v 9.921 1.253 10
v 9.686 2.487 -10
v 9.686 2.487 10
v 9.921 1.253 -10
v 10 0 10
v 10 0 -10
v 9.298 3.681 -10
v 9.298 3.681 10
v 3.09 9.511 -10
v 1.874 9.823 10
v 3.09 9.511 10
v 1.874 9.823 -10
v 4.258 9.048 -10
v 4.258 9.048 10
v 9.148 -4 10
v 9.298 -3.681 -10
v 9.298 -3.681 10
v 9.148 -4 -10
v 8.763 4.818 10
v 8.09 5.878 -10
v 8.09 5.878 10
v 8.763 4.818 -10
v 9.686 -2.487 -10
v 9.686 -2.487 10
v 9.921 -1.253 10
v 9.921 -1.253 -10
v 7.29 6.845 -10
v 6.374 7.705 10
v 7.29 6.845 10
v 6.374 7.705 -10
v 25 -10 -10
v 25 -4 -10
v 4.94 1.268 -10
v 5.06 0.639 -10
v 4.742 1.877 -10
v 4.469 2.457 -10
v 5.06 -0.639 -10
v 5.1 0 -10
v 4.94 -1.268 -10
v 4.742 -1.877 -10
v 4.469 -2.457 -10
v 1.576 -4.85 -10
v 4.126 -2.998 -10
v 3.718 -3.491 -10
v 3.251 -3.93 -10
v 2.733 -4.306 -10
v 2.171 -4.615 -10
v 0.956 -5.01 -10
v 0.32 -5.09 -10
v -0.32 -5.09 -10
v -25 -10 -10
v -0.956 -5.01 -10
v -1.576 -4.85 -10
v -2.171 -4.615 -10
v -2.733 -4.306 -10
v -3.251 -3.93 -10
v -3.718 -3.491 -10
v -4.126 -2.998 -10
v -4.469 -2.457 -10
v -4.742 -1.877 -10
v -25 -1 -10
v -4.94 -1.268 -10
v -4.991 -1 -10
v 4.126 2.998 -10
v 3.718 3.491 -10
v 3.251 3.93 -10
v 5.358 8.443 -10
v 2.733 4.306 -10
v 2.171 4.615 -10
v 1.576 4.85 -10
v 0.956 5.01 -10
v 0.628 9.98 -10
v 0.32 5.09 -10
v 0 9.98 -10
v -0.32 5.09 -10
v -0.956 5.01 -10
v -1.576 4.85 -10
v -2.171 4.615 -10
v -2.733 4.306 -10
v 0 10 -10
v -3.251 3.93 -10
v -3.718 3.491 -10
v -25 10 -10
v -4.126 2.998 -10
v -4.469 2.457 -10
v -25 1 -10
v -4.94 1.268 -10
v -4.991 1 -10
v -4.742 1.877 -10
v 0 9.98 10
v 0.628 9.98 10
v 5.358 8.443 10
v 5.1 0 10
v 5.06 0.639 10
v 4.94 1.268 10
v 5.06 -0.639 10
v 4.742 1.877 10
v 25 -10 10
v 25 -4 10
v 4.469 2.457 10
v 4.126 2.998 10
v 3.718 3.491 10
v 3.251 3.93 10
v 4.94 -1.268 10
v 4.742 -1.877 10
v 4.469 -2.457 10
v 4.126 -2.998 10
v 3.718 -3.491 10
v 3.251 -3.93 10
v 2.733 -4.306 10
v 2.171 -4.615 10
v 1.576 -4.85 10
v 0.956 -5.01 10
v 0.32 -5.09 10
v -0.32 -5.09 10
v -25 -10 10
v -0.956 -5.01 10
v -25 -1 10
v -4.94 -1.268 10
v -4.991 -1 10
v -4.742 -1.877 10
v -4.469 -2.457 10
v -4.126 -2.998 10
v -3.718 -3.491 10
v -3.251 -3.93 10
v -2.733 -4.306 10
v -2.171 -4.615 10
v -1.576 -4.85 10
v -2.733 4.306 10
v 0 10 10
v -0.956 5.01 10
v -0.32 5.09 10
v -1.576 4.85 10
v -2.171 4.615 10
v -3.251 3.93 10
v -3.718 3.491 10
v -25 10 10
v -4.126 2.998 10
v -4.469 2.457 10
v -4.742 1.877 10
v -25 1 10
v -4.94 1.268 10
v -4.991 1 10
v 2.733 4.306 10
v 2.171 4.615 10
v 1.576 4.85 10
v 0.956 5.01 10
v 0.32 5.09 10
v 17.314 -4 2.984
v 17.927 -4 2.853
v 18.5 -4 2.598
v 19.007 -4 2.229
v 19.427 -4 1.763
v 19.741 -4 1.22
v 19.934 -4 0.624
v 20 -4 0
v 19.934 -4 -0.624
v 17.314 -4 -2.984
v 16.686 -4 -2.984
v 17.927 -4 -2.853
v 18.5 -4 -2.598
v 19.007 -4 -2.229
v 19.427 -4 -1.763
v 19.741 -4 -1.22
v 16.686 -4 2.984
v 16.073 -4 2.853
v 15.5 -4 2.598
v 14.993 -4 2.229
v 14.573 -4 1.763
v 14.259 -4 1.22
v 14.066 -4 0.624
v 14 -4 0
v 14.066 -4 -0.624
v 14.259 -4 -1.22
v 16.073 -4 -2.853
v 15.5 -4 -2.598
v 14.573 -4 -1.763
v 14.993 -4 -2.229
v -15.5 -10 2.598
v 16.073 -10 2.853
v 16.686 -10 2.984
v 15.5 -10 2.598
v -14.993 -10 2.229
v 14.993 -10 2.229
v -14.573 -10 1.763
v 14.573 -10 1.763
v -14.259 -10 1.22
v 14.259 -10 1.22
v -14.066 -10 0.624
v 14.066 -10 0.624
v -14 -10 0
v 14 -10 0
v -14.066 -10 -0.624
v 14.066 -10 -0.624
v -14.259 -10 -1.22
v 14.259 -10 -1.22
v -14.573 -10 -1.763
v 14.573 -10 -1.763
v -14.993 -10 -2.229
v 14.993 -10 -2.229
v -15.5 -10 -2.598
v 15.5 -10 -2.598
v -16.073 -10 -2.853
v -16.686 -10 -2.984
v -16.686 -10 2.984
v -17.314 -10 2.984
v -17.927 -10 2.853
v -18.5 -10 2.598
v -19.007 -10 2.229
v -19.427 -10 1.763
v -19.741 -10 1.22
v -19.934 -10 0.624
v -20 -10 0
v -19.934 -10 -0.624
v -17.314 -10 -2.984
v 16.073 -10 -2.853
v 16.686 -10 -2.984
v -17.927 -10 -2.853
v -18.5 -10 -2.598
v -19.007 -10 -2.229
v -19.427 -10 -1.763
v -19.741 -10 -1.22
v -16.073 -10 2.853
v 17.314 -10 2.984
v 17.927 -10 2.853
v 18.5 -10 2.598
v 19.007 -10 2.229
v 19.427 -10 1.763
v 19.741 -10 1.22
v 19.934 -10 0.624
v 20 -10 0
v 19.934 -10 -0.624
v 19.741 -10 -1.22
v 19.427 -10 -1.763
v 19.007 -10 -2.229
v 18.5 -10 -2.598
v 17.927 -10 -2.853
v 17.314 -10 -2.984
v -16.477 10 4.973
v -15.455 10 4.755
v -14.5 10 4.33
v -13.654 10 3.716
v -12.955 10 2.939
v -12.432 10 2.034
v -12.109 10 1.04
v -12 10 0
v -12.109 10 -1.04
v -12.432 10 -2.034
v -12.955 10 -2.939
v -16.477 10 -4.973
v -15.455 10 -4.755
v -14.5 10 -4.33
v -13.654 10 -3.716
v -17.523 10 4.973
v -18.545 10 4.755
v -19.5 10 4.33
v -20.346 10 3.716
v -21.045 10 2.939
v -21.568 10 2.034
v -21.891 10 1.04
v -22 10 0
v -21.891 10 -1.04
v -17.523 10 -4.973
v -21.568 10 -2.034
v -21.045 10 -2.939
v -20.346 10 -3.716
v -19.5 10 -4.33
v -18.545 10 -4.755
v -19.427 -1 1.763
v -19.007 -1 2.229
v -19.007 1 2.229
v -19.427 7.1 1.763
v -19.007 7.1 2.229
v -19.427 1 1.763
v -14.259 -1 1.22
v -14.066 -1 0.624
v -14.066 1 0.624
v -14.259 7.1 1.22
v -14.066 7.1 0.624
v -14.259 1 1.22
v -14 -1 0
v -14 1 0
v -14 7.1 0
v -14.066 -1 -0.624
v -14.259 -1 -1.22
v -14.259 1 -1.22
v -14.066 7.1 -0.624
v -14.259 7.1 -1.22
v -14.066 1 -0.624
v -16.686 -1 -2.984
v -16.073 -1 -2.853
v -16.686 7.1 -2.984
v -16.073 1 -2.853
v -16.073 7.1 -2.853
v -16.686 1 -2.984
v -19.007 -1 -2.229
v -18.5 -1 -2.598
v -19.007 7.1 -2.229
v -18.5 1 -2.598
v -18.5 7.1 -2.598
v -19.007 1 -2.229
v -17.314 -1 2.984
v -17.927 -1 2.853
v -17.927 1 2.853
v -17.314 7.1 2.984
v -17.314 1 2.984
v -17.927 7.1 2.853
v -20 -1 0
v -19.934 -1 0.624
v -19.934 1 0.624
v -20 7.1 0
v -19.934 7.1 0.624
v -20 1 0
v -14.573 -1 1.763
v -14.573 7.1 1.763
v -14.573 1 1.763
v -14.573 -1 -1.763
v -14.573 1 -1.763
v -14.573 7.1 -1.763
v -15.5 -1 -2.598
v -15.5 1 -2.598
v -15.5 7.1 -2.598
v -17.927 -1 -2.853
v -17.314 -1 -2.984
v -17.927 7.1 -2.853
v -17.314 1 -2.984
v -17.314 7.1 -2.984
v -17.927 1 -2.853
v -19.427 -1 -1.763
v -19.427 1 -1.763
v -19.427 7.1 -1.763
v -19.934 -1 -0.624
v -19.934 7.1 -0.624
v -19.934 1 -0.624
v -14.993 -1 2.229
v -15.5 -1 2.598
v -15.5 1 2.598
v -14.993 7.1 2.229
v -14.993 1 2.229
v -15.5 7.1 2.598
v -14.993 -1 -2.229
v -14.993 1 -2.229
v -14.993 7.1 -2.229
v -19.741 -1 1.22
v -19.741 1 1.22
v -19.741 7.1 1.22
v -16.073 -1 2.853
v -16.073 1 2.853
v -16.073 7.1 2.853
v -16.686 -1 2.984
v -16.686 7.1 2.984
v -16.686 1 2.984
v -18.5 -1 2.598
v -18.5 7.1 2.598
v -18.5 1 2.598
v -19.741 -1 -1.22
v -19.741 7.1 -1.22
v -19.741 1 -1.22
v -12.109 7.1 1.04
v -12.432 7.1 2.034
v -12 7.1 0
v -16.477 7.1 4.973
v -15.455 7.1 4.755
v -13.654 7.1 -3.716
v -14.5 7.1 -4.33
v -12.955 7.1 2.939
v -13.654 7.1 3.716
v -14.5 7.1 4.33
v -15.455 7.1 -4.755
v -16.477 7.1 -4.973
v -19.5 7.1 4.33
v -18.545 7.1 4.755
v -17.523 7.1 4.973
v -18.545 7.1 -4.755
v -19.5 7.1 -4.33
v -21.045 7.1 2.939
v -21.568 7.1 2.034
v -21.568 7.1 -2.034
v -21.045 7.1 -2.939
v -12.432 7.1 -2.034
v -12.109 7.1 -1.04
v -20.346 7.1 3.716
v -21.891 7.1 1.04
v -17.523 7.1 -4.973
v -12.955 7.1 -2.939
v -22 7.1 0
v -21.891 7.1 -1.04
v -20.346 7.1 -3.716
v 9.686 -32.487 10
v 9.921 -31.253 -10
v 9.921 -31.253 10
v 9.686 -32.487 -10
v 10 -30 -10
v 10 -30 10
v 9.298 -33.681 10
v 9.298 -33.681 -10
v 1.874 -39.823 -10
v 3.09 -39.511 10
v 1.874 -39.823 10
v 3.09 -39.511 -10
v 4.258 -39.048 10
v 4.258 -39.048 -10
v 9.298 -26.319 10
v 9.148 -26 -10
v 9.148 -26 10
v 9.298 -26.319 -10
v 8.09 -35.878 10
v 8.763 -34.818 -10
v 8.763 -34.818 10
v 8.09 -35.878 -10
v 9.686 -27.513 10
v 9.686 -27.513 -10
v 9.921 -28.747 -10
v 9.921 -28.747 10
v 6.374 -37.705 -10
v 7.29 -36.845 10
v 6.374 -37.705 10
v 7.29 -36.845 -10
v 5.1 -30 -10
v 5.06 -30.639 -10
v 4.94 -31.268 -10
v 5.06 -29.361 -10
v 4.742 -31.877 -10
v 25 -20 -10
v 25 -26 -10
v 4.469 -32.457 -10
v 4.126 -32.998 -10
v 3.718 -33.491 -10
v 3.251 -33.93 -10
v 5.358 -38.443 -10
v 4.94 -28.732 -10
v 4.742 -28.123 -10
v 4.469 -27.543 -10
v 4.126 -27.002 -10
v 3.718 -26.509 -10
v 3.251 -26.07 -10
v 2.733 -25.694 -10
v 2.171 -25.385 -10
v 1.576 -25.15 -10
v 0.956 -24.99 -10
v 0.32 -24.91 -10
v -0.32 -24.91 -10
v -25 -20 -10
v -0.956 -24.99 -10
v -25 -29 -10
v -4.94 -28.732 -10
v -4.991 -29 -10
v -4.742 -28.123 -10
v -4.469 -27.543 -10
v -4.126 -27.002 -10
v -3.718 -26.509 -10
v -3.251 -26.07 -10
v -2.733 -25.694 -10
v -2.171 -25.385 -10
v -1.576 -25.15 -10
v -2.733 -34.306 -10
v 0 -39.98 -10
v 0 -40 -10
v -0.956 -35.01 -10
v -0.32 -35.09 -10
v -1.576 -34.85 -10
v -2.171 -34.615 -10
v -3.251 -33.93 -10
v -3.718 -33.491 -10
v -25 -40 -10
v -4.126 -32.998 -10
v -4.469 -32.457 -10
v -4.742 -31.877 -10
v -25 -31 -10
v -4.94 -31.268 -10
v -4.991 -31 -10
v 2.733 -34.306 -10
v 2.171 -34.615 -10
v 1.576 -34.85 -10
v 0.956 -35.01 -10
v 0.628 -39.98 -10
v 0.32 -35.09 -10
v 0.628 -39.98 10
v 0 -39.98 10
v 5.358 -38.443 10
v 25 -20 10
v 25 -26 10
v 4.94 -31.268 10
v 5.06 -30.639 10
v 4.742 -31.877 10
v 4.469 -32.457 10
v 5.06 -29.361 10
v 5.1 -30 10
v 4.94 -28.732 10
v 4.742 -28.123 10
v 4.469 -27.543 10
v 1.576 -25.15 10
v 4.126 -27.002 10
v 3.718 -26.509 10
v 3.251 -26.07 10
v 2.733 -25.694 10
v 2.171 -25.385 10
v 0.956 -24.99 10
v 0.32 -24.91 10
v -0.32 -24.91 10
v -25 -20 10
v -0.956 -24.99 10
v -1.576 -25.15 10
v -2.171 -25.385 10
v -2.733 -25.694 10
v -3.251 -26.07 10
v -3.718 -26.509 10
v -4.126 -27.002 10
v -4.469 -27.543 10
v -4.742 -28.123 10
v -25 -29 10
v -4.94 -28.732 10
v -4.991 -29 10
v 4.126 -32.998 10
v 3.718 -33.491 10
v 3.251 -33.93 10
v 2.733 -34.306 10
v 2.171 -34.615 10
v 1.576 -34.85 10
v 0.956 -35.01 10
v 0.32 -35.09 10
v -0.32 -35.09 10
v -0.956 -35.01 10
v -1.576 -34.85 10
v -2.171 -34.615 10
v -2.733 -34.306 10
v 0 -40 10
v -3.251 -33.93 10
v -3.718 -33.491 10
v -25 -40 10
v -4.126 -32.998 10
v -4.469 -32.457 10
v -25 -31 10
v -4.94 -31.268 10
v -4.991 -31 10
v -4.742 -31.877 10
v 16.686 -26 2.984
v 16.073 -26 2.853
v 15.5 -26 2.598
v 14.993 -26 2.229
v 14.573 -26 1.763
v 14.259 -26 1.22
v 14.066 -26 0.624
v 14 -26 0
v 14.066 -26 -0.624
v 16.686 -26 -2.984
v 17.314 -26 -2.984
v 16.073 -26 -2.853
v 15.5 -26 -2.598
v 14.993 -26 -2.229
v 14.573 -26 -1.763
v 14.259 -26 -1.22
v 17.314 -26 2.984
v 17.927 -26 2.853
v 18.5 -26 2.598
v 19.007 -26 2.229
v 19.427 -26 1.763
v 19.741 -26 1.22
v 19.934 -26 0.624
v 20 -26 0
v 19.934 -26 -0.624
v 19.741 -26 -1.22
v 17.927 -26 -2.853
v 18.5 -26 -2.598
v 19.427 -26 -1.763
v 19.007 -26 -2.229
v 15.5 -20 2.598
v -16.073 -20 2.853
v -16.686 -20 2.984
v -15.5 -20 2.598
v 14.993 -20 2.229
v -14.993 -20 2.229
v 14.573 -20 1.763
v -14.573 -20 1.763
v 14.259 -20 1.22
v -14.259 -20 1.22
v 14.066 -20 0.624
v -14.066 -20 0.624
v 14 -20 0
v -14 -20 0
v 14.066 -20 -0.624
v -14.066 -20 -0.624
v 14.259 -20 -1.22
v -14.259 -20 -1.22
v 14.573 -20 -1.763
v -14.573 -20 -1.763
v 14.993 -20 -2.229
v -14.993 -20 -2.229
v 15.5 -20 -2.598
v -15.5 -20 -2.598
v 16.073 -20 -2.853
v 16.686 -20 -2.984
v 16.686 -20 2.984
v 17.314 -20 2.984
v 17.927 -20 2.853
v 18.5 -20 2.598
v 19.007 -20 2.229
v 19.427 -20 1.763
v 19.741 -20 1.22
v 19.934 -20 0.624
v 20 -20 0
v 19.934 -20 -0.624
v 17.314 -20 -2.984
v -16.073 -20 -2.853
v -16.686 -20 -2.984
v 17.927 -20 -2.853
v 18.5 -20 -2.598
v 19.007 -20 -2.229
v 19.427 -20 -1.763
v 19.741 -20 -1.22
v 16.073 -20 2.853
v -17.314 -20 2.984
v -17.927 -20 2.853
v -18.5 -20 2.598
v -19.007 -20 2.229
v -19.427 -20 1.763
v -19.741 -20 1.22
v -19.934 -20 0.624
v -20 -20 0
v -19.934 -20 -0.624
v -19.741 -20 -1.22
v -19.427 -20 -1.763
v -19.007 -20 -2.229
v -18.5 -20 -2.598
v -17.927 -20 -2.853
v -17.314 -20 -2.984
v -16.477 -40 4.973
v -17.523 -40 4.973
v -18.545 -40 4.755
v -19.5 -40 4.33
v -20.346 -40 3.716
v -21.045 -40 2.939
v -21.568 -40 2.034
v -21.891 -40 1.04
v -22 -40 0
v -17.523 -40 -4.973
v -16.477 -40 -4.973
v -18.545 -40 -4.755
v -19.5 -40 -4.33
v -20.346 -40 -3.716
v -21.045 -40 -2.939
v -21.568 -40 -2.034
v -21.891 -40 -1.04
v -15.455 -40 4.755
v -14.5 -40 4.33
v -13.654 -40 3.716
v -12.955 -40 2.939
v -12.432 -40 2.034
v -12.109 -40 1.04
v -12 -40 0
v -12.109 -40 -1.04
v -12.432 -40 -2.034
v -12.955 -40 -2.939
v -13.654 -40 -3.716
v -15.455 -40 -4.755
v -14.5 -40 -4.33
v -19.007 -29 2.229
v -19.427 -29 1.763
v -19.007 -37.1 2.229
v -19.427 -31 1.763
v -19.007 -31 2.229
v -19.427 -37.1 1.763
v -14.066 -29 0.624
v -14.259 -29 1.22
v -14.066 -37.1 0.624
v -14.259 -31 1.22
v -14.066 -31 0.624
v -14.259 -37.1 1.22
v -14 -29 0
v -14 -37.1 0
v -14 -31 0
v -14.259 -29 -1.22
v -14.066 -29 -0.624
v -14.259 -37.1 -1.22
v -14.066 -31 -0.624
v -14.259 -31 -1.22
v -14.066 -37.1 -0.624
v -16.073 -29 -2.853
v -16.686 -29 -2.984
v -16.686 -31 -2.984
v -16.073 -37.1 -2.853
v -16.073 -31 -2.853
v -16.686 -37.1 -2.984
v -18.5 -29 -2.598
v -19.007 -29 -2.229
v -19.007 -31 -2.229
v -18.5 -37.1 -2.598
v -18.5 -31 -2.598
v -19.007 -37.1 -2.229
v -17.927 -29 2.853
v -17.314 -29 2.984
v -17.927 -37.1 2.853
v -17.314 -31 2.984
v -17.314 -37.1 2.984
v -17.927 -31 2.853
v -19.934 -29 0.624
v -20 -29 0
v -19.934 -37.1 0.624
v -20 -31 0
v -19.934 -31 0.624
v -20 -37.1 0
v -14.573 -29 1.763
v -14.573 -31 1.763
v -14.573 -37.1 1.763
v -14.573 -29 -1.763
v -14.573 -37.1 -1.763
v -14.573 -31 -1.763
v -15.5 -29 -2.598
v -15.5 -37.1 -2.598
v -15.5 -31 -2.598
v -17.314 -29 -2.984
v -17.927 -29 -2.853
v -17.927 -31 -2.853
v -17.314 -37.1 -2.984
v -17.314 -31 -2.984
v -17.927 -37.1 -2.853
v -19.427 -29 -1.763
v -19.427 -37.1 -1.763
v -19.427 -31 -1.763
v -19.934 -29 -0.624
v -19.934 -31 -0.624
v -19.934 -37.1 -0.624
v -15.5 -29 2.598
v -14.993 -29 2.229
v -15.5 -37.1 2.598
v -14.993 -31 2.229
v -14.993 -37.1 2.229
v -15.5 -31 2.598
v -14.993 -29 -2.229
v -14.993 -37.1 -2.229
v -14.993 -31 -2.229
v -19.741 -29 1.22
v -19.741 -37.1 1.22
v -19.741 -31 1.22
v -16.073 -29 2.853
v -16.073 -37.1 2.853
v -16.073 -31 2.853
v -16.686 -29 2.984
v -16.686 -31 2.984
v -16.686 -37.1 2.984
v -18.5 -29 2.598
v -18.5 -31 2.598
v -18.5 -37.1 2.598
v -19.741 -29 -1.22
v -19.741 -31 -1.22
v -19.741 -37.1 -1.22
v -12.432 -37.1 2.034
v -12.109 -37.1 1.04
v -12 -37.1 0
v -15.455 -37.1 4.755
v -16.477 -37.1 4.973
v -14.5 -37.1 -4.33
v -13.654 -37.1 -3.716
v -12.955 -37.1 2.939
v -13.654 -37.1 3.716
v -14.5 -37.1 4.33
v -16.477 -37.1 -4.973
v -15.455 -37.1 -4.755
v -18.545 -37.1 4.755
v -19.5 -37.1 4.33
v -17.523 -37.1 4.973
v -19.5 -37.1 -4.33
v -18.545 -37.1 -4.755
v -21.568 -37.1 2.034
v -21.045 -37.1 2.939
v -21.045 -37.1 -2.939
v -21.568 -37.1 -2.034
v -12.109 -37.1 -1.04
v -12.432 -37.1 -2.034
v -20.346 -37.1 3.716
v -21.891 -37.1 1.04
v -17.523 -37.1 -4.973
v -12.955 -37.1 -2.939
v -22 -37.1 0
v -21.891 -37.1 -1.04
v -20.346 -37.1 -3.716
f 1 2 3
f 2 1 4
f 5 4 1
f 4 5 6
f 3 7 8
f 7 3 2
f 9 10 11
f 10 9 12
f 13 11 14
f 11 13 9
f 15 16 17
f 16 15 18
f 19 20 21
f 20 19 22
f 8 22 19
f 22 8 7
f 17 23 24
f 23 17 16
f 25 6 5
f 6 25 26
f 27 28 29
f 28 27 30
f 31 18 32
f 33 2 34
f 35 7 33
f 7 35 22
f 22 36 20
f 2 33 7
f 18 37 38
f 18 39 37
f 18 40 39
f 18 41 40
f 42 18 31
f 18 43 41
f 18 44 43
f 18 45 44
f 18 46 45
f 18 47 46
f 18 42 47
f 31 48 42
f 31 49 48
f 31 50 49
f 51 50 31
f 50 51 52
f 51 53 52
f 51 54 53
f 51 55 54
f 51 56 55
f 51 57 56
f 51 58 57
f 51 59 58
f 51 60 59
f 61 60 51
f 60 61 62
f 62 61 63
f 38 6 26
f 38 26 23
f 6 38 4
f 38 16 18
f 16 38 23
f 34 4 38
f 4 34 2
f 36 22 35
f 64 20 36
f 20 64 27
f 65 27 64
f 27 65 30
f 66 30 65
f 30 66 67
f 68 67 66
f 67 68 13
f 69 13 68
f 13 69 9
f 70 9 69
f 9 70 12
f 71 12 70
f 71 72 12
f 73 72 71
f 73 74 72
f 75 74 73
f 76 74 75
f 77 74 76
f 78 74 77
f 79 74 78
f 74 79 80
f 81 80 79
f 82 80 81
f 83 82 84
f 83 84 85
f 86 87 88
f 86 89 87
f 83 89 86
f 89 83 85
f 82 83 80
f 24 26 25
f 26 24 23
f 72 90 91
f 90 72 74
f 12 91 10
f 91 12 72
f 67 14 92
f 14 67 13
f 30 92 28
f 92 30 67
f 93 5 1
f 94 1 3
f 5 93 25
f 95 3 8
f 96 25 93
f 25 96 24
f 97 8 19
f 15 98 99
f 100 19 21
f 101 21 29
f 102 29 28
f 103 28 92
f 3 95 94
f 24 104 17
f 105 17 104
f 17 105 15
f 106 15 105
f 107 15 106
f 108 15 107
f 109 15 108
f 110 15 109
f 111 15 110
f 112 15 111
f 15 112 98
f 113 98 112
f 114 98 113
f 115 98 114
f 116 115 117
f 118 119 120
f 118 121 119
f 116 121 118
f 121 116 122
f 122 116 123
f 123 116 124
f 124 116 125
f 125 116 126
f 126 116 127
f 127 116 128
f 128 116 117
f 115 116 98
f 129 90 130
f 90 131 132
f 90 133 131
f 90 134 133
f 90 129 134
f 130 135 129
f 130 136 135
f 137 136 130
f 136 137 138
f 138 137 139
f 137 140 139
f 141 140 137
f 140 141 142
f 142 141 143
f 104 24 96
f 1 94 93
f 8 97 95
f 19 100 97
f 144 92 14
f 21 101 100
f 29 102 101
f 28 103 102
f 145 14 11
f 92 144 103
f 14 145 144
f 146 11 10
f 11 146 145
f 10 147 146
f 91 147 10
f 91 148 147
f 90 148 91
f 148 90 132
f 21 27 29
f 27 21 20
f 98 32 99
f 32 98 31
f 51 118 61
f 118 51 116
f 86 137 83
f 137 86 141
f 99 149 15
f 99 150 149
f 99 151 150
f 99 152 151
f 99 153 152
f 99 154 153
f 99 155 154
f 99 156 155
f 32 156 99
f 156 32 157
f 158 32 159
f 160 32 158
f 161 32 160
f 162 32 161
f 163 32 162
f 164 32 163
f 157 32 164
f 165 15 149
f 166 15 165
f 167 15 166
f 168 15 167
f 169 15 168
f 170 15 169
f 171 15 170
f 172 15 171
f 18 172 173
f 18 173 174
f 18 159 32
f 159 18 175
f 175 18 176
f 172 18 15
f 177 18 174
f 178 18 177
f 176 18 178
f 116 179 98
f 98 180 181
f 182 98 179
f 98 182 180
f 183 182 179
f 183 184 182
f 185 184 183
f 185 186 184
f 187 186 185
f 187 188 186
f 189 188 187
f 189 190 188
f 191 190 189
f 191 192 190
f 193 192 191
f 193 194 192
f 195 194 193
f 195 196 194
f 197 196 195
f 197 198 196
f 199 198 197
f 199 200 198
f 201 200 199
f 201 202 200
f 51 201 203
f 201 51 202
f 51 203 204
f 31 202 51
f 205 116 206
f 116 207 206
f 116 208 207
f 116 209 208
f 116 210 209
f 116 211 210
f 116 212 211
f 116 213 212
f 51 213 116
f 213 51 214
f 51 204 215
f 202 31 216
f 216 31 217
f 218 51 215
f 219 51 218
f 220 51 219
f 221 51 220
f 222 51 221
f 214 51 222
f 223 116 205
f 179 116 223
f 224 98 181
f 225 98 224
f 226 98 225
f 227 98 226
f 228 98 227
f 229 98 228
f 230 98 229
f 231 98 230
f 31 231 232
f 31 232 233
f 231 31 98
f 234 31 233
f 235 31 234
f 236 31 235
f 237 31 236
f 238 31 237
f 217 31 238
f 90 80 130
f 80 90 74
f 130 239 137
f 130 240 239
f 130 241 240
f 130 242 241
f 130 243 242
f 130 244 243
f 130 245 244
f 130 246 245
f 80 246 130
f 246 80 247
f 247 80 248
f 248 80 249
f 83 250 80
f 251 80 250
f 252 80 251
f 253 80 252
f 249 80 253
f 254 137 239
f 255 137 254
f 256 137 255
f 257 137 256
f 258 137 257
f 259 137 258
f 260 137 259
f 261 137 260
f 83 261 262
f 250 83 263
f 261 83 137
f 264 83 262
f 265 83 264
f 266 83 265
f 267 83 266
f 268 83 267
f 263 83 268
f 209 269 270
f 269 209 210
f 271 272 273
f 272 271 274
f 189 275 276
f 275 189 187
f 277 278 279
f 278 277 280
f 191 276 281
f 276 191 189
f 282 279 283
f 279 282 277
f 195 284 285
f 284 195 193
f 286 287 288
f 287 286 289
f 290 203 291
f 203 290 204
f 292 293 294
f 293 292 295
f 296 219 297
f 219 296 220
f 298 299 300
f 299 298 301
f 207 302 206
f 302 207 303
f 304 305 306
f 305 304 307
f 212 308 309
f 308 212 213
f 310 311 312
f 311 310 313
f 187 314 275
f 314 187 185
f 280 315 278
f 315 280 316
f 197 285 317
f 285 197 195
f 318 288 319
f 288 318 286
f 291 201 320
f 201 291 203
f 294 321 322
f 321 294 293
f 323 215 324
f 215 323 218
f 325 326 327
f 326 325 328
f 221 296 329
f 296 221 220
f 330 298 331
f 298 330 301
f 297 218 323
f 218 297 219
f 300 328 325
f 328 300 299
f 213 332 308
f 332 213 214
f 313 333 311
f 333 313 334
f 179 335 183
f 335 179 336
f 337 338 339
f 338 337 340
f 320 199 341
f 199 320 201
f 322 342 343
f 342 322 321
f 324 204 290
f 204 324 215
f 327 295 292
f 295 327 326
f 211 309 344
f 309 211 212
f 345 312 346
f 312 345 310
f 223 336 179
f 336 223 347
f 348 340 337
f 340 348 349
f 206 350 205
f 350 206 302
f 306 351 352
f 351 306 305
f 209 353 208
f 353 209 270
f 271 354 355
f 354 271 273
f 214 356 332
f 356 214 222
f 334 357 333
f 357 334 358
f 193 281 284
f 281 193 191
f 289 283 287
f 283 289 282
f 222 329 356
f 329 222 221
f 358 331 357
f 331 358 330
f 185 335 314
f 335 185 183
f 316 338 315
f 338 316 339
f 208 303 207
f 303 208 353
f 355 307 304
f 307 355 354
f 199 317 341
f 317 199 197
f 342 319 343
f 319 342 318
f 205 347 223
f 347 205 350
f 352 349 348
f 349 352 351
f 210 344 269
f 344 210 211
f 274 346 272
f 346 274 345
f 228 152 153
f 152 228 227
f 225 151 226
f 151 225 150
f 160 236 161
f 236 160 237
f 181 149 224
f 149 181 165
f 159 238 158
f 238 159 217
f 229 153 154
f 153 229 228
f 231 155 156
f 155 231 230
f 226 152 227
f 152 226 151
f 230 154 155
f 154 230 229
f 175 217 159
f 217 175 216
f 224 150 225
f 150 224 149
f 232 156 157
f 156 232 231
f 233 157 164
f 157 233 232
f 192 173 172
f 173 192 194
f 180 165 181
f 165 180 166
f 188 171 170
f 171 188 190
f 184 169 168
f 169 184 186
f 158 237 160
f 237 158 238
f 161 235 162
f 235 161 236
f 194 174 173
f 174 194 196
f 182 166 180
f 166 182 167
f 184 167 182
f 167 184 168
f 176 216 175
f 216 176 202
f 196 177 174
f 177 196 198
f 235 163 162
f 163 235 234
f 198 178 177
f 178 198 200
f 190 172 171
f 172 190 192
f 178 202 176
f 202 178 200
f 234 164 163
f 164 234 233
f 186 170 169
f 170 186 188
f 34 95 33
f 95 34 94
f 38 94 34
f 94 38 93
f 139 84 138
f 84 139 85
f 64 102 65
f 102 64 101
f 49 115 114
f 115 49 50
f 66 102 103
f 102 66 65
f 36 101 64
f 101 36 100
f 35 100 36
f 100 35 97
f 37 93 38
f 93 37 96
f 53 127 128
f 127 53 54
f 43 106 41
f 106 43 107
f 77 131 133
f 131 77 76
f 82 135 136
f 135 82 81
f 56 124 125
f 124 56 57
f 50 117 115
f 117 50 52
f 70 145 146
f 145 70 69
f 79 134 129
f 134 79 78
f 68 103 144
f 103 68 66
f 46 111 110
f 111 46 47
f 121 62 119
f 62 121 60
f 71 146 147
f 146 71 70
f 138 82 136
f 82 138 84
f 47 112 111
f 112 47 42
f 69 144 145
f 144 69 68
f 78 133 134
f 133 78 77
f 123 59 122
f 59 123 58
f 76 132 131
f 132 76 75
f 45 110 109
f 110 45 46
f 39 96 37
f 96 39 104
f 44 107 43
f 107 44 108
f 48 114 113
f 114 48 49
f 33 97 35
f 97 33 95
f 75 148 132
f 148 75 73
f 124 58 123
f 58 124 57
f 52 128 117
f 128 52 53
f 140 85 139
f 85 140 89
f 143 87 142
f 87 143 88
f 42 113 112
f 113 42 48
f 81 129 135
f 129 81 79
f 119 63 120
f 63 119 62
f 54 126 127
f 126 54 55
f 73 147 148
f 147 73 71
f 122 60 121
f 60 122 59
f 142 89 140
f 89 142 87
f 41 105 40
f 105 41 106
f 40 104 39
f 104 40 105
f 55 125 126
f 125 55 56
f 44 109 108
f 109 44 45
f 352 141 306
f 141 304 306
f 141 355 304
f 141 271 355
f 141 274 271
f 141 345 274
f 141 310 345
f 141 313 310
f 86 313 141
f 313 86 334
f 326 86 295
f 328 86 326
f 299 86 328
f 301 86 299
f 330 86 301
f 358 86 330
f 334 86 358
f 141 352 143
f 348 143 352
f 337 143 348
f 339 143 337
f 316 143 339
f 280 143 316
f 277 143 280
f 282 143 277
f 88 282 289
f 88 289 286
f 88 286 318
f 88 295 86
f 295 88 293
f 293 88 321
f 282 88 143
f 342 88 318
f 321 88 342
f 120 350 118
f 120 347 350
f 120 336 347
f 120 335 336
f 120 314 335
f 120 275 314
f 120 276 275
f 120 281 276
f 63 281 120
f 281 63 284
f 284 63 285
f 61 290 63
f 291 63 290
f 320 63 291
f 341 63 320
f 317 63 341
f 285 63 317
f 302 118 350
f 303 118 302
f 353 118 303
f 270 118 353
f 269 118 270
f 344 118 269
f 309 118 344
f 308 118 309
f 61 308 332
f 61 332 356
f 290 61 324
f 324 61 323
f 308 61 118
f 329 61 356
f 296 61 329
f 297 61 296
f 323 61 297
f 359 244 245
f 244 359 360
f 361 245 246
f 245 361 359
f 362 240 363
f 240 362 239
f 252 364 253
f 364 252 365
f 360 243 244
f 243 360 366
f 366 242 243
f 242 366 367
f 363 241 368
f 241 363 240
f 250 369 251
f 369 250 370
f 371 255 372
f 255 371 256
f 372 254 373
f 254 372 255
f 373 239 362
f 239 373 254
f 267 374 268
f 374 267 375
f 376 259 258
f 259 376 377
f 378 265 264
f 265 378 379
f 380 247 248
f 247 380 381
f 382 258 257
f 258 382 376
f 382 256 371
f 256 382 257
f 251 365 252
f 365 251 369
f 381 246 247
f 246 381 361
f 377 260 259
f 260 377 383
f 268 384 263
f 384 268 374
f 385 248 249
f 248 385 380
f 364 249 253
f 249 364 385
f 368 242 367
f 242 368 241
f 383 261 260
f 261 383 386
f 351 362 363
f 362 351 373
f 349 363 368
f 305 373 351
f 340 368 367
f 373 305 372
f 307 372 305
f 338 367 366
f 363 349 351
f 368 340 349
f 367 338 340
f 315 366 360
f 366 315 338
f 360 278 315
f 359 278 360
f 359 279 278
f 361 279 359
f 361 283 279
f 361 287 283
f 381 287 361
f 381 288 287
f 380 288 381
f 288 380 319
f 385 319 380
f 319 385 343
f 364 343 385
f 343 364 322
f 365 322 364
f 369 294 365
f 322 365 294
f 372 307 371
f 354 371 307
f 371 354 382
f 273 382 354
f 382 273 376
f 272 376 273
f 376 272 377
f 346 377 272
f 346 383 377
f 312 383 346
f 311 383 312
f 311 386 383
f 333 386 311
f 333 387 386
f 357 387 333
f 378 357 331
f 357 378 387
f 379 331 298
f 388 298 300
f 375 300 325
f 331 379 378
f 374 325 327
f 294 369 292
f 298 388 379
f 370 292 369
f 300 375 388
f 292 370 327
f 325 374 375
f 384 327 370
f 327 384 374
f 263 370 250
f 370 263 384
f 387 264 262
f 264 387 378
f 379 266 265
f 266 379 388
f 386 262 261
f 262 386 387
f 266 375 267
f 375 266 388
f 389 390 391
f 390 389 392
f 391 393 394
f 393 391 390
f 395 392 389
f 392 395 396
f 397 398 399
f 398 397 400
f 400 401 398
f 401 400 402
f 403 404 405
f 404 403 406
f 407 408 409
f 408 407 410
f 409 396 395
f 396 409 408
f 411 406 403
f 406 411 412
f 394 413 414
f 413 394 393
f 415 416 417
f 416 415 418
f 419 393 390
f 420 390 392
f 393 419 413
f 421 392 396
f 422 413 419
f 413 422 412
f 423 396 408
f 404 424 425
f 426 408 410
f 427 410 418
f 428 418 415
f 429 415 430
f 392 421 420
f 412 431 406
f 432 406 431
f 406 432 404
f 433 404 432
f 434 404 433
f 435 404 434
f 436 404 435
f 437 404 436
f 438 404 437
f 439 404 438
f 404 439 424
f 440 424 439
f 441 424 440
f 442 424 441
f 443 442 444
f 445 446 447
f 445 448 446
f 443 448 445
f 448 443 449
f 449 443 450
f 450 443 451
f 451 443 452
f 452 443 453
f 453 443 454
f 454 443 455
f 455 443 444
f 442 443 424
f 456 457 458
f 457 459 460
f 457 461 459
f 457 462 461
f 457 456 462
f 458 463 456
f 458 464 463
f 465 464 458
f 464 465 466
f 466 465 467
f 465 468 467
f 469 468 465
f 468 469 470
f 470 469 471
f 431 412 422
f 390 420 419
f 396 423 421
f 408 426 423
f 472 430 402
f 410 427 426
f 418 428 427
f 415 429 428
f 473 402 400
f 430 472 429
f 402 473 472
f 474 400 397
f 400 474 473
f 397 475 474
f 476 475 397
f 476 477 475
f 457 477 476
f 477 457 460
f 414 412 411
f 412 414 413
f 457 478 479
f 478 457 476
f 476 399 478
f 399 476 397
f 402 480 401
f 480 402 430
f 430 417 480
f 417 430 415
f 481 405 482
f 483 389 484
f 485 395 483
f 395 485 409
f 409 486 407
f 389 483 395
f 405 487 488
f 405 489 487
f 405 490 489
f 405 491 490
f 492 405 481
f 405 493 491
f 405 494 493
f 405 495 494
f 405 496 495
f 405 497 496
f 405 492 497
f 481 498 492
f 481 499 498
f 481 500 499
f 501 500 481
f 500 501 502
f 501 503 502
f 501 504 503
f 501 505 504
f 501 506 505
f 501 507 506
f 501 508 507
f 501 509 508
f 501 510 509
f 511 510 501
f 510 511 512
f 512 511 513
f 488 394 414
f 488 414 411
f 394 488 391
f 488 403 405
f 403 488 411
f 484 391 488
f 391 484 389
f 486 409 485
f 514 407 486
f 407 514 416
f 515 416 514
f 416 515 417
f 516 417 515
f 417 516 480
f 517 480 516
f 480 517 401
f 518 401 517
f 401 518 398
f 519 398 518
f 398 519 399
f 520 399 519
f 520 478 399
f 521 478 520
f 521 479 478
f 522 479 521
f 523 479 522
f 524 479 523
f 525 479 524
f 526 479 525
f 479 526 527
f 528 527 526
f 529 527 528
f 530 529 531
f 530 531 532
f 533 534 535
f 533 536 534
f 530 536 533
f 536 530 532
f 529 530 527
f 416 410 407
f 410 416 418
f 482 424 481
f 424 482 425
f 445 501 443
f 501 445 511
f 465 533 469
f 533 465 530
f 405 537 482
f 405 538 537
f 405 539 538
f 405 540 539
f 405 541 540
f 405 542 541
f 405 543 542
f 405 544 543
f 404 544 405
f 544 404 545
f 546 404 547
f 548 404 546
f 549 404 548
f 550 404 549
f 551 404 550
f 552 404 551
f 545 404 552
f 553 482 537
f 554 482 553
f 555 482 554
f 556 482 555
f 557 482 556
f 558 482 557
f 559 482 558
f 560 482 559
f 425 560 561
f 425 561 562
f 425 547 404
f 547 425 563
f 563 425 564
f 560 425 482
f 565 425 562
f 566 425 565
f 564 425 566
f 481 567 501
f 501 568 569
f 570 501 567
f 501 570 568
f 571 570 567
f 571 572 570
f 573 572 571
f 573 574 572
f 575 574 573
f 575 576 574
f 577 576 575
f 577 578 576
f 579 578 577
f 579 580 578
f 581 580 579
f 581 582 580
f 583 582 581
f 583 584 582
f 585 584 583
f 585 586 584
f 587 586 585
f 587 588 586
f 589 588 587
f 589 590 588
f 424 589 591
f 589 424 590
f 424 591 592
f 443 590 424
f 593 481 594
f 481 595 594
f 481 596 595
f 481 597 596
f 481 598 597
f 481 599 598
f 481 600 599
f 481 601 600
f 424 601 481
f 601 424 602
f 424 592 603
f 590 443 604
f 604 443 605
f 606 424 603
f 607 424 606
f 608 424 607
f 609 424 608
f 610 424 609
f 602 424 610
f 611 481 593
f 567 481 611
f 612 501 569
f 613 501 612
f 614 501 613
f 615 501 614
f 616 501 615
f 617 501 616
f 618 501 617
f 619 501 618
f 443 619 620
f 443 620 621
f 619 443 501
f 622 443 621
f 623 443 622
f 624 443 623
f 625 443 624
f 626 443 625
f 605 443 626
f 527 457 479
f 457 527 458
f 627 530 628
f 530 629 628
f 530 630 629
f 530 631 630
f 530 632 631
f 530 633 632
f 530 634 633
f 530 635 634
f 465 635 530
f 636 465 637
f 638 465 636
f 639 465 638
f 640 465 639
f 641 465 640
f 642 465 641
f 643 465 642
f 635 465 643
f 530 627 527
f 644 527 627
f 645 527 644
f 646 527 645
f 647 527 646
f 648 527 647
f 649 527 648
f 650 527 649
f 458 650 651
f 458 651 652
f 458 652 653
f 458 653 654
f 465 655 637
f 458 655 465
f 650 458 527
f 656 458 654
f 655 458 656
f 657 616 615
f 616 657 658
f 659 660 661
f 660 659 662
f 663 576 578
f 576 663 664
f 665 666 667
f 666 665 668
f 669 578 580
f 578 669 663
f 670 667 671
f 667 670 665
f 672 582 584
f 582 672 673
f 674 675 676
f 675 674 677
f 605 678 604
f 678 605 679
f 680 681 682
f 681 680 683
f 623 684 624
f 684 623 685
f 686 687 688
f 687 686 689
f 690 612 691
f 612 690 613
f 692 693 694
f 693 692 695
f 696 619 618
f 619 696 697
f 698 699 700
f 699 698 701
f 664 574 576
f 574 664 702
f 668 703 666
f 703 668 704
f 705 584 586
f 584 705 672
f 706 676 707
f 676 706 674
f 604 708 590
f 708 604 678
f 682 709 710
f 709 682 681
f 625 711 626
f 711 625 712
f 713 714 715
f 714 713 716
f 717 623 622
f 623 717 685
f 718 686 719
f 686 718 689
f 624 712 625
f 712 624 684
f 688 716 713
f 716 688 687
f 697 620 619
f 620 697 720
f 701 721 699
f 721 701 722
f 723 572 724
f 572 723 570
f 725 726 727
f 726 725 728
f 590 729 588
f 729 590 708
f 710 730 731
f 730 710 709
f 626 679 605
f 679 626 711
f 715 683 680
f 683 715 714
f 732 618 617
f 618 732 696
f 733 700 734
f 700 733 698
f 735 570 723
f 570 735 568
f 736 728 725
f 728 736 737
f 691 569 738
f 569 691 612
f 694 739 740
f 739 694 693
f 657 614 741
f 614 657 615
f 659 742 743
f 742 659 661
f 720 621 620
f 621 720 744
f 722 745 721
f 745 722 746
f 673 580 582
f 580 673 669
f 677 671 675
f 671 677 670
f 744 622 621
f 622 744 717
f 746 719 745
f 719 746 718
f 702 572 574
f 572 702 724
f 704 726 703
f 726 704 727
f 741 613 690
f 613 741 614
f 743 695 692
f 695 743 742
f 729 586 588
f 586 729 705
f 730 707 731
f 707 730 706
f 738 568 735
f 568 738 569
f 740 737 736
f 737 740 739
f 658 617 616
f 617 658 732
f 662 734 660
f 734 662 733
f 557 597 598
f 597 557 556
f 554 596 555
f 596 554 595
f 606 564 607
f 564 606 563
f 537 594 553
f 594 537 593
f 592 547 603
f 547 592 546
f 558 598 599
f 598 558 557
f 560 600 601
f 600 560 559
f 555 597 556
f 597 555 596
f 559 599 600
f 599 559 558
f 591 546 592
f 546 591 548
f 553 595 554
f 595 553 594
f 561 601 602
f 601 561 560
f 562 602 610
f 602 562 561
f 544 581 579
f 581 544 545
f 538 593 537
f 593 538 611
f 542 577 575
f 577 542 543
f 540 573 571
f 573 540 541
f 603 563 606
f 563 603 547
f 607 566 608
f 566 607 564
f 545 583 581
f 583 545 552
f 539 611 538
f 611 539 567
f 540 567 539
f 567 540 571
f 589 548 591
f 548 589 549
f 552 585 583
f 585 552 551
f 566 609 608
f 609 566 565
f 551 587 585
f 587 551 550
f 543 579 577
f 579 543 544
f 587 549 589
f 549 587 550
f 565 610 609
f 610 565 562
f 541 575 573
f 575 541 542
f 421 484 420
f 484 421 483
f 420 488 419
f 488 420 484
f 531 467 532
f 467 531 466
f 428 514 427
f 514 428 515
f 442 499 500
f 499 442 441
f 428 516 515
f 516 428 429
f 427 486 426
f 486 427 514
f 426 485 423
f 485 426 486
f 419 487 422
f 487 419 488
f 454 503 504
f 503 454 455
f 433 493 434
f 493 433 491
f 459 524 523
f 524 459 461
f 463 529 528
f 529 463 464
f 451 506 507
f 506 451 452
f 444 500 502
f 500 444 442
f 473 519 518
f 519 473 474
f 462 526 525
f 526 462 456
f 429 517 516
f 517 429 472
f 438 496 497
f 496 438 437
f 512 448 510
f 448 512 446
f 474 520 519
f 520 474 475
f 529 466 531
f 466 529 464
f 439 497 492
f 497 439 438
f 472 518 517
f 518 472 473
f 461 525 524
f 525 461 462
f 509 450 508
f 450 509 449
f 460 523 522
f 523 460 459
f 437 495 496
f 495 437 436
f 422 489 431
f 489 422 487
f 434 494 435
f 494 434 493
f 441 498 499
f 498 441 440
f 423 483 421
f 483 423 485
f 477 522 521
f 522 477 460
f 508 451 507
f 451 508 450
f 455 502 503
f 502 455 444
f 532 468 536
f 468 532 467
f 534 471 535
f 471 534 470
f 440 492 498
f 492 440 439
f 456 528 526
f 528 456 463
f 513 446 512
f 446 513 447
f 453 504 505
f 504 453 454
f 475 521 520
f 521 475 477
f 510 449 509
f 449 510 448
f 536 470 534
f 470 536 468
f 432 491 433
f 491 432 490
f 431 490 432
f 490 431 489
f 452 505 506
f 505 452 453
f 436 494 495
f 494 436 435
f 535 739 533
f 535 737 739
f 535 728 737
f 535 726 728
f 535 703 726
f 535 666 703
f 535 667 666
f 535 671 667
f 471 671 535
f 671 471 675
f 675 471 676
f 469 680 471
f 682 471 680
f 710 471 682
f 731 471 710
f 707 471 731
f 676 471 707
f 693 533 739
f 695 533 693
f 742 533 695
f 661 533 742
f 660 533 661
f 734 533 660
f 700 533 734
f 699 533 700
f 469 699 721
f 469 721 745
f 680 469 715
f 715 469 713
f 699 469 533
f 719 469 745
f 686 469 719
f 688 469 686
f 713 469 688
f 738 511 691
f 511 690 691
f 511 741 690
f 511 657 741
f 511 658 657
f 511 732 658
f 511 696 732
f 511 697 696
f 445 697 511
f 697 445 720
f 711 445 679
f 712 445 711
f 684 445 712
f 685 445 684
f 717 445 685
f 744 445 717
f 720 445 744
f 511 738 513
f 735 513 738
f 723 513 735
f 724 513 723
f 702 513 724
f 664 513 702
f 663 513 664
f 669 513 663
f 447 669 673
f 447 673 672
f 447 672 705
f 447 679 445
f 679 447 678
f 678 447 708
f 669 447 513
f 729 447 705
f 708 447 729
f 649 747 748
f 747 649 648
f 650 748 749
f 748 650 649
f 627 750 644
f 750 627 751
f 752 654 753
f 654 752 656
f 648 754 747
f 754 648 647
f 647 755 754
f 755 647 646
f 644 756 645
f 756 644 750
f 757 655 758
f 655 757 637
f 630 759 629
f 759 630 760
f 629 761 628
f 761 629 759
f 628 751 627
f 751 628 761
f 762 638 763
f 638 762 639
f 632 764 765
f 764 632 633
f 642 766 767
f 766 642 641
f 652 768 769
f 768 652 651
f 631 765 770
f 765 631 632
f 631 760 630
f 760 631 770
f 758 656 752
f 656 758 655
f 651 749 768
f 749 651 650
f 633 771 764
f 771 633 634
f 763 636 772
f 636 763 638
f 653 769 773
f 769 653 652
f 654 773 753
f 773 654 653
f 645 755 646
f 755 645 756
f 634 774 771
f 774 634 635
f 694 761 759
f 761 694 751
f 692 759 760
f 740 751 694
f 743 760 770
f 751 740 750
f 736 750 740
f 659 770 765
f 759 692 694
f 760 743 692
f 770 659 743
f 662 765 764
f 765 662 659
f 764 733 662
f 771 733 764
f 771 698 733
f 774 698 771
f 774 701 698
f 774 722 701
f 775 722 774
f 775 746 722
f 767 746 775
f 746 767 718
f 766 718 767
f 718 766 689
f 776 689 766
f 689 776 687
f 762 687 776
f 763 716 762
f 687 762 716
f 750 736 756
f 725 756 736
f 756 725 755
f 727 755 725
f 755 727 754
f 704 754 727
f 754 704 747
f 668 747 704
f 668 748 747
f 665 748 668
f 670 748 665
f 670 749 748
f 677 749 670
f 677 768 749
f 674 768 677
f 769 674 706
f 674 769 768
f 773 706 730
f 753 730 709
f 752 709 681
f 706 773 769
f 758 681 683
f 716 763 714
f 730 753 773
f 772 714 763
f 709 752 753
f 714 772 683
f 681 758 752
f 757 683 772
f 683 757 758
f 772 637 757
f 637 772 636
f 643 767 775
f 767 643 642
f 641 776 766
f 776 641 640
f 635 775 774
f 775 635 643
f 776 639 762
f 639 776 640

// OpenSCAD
clamp();
translate([0, -30, 0]) mirror([0,1,0]) clamp();


module clamp() {
	difference() {
		union() {
			cylinder(r=10, h=20, center=true, $fn=50);
			translate([0, -10+3, 0])
				cube([50, 6, 20], true);
			translate([-12.5, 0, 0])
				cube([25, 20, 20], true);
		}
		cylinder(r=5.1, h=21, center=true, $fn=50);
		translate([-12.6, 0, 0])
			cube([25, 2, 21], true);
		for (i=[-1, 1])
			translate([i*17, 0, 0])
				rotate([90, 0, 0])
					cylinder(r=3, h=40, center=true, $fn=30);
		translate([-17, 10-1.5+0.1, 0])
			rotate([90, 0, 0])
				cylinder(r=5, h=3, center=true, $fn=30);
	}
}
